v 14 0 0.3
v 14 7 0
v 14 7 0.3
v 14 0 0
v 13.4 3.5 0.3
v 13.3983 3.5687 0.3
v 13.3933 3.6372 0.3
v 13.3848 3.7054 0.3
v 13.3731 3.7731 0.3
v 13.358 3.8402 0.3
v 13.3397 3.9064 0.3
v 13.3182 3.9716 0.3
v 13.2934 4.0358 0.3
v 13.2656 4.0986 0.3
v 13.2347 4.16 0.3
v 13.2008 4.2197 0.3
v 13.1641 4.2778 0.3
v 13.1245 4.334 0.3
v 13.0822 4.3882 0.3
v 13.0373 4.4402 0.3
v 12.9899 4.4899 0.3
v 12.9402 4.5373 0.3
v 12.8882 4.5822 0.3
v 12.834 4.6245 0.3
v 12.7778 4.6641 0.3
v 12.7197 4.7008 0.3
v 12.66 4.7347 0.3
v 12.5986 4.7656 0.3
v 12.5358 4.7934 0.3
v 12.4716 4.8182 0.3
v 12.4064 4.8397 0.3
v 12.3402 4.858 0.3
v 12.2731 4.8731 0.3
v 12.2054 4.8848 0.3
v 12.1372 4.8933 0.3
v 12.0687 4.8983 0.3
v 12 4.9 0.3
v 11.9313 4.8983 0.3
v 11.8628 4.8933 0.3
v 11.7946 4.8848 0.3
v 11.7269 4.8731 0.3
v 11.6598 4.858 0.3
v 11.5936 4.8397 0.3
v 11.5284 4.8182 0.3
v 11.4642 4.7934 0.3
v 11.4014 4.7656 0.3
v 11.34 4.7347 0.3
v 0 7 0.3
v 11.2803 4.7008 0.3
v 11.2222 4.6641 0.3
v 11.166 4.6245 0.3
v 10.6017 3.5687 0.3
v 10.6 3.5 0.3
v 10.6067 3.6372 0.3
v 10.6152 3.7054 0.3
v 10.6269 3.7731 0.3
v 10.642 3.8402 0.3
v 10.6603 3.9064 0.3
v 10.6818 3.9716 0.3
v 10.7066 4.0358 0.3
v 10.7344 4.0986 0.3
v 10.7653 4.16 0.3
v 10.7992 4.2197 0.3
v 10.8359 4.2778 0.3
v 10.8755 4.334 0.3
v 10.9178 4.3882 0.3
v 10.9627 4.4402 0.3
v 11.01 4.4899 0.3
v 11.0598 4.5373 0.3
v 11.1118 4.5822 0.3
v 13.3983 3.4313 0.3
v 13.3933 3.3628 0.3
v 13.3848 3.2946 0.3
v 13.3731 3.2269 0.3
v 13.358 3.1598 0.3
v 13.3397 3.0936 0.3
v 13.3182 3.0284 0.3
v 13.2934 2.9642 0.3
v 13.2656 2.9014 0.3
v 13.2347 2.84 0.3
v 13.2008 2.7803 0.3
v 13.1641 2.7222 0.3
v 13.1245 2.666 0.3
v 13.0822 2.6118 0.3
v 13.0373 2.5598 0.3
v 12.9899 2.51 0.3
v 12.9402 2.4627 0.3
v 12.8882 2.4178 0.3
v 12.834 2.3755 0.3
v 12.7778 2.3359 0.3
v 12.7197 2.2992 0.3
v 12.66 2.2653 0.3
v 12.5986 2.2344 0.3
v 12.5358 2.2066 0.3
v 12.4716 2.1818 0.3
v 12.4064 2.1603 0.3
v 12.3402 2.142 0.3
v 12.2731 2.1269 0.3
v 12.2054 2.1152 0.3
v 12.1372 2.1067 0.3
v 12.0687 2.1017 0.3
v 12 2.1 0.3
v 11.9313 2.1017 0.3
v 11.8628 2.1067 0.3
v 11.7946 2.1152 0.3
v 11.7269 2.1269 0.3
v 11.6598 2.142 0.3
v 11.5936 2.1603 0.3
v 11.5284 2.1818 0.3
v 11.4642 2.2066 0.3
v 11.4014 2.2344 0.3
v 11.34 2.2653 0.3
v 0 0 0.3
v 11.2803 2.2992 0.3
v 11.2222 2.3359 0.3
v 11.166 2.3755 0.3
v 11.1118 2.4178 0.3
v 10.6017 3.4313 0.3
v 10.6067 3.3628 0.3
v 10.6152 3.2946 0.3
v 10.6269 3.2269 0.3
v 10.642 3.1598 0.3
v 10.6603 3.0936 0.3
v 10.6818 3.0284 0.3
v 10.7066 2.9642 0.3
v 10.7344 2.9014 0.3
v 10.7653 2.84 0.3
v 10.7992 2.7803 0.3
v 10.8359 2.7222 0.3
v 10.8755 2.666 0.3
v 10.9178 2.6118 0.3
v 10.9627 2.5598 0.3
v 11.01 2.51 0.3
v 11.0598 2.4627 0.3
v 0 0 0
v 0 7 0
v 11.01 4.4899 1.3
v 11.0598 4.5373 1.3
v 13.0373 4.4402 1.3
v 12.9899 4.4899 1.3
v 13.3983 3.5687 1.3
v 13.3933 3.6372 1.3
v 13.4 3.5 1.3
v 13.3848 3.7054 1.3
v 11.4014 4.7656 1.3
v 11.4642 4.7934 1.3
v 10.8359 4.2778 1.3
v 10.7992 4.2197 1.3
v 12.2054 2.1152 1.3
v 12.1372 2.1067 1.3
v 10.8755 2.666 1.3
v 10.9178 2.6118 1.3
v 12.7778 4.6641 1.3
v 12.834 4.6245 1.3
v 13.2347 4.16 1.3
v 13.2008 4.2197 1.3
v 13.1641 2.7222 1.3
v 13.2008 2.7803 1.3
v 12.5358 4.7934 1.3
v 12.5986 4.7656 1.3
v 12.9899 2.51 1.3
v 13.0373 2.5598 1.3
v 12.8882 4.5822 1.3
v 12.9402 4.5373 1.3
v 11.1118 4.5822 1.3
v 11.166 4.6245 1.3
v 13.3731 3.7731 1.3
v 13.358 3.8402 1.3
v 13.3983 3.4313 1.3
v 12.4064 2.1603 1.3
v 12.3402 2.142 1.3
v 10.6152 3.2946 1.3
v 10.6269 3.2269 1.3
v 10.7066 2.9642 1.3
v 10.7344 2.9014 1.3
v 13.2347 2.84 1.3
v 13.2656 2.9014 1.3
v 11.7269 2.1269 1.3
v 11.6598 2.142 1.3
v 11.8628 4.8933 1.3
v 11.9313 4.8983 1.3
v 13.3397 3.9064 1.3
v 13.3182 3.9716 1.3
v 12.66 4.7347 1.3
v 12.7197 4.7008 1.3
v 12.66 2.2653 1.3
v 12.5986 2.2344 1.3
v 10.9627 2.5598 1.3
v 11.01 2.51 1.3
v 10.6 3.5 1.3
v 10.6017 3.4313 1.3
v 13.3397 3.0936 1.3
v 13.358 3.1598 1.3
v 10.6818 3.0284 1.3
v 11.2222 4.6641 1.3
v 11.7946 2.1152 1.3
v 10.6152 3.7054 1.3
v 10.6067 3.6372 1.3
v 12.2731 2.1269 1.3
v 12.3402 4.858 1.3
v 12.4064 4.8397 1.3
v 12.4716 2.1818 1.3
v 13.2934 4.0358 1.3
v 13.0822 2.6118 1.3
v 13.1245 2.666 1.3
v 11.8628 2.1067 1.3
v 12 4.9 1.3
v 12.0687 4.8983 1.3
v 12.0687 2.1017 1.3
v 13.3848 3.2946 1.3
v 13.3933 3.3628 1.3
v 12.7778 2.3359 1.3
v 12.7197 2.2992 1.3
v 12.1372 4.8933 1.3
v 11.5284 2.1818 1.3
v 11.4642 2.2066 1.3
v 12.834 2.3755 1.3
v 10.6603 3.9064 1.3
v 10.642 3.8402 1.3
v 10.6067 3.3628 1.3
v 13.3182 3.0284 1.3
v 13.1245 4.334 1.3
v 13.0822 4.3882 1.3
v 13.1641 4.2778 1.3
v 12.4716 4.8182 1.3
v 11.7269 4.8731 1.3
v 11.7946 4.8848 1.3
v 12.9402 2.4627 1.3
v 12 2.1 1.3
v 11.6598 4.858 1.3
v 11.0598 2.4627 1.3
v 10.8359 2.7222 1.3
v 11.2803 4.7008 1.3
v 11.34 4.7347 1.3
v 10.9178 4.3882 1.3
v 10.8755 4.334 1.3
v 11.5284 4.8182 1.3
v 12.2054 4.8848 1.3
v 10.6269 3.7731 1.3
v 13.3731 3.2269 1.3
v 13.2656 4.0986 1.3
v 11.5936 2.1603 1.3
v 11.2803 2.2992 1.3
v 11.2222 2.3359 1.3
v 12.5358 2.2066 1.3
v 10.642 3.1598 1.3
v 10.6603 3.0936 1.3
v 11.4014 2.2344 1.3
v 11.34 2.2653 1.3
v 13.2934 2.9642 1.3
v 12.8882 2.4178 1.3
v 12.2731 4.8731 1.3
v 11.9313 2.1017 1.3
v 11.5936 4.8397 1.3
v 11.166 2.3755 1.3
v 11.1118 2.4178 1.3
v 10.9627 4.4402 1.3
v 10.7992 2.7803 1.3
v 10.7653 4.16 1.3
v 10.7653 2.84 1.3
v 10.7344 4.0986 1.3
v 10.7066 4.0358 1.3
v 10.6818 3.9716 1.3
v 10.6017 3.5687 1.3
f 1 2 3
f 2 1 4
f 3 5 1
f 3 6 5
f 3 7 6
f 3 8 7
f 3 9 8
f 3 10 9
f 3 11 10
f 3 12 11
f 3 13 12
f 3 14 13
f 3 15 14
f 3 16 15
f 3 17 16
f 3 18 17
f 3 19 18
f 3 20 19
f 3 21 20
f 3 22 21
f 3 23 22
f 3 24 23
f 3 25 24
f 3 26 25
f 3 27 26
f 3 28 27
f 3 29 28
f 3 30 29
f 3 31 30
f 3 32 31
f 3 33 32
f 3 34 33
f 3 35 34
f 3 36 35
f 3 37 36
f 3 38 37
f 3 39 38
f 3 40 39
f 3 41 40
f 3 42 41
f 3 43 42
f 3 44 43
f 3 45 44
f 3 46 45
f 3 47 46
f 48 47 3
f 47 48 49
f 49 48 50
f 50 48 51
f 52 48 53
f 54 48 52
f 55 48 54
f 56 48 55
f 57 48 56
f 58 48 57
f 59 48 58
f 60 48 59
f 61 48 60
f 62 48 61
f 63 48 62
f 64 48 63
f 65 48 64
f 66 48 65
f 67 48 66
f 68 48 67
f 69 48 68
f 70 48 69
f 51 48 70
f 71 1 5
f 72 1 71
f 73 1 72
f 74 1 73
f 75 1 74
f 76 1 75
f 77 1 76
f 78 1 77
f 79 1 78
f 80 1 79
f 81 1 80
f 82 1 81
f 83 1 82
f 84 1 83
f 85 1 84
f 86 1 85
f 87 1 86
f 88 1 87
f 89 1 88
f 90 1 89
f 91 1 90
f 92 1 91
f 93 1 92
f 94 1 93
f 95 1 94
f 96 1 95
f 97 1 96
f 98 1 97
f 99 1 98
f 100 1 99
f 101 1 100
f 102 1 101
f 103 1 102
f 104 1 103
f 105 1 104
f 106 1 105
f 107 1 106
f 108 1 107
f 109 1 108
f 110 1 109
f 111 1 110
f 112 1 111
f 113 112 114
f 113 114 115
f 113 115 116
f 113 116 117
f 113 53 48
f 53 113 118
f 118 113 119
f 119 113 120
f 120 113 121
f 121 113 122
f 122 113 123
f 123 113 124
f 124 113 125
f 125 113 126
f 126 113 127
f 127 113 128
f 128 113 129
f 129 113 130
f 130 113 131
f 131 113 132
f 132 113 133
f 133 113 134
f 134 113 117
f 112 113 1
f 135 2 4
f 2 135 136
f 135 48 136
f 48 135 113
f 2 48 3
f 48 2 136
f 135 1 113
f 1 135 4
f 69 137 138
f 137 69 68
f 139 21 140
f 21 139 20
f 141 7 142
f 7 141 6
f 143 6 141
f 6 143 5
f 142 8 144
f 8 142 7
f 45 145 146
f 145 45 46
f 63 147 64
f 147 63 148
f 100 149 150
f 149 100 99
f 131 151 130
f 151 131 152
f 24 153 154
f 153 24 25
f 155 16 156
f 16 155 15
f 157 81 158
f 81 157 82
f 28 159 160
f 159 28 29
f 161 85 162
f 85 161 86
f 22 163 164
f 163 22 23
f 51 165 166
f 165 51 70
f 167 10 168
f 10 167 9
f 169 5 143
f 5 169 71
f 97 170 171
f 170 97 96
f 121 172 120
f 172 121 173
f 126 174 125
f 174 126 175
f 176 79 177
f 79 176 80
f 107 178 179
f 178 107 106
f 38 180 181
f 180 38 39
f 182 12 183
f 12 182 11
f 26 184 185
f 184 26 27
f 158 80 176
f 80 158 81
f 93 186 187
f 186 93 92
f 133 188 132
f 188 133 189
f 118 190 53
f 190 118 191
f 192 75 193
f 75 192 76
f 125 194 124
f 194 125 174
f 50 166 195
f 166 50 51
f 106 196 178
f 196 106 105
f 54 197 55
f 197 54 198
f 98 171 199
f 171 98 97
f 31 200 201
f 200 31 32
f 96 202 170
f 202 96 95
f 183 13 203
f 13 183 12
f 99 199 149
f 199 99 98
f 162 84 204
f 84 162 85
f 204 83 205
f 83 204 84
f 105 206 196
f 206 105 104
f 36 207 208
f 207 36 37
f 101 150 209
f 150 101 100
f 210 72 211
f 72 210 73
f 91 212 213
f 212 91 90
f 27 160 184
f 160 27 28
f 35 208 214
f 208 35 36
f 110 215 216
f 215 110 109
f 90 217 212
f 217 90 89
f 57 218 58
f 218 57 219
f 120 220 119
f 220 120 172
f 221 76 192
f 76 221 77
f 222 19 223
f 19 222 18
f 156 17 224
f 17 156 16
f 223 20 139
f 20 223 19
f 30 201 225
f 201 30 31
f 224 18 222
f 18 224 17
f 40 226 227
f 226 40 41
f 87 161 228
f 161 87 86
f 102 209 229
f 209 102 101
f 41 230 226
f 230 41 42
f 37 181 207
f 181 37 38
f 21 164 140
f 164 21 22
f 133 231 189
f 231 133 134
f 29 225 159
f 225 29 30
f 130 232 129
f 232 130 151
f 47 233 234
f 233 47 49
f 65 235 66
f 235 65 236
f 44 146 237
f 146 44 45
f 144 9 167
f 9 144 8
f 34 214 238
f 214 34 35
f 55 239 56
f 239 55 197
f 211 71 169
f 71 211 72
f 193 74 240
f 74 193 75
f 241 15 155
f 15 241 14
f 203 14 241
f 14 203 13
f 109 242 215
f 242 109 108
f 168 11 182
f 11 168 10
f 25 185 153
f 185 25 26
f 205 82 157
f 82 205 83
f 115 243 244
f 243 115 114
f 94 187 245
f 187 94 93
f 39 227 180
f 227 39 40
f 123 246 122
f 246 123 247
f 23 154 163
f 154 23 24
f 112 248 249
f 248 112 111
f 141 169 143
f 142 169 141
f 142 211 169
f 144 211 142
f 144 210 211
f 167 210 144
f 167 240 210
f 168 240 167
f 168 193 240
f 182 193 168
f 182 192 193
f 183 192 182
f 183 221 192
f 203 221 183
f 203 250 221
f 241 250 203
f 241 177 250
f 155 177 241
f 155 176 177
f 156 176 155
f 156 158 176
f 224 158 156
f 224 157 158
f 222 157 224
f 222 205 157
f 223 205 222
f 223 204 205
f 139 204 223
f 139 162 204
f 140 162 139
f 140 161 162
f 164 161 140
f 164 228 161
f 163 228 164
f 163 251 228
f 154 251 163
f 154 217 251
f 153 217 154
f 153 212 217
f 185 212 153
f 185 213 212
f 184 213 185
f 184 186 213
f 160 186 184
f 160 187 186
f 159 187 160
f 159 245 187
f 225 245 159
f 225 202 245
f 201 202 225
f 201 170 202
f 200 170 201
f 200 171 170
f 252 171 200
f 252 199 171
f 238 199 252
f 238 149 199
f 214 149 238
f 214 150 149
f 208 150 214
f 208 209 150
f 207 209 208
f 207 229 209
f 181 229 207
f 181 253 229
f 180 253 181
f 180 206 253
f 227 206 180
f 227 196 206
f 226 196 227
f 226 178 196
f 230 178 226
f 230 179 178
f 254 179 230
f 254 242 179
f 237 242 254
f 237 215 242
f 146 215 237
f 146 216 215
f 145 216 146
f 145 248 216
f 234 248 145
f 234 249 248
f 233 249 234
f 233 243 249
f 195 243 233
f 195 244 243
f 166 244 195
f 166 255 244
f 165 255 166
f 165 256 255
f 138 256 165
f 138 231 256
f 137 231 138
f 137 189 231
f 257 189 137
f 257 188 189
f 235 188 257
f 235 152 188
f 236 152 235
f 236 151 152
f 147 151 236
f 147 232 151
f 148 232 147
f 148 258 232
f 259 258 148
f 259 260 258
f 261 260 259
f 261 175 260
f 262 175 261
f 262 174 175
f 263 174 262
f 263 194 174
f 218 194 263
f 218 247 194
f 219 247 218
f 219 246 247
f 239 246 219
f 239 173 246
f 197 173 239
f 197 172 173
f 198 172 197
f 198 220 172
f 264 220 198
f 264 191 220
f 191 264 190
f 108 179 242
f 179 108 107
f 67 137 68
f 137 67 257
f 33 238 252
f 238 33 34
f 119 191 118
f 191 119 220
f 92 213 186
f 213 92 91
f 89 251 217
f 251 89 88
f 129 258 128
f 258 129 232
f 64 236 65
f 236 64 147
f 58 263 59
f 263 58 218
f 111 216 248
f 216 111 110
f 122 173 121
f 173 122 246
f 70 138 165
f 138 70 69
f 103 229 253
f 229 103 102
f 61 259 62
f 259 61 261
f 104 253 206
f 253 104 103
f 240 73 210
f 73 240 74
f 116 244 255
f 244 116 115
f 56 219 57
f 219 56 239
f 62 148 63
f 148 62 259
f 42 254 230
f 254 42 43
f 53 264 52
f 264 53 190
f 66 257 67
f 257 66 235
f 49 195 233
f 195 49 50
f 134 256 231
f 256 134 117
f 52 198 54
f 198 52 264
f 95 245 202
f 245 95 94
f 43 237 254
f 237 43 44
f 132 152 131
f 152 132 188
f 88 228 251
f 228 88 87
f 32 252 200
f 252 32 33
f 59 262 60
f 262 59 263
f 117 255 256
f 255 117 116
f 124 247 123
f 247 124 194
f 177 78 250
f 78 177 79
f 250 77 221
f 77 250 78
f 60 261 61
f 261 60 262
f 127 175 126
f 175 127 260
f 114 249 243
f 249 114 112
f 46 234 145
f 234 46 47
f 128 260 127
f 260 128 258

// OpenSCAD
$fn=$preview ? 16 : 128;

h=0.3;
tapp_h=1.0;
tapp_d=2.8;

color("blue") {
    cube([14,7,h]);
}

translate([12,3.5,h]) {
    cylinder(d=tapp_d, h=tapp_h);
}
